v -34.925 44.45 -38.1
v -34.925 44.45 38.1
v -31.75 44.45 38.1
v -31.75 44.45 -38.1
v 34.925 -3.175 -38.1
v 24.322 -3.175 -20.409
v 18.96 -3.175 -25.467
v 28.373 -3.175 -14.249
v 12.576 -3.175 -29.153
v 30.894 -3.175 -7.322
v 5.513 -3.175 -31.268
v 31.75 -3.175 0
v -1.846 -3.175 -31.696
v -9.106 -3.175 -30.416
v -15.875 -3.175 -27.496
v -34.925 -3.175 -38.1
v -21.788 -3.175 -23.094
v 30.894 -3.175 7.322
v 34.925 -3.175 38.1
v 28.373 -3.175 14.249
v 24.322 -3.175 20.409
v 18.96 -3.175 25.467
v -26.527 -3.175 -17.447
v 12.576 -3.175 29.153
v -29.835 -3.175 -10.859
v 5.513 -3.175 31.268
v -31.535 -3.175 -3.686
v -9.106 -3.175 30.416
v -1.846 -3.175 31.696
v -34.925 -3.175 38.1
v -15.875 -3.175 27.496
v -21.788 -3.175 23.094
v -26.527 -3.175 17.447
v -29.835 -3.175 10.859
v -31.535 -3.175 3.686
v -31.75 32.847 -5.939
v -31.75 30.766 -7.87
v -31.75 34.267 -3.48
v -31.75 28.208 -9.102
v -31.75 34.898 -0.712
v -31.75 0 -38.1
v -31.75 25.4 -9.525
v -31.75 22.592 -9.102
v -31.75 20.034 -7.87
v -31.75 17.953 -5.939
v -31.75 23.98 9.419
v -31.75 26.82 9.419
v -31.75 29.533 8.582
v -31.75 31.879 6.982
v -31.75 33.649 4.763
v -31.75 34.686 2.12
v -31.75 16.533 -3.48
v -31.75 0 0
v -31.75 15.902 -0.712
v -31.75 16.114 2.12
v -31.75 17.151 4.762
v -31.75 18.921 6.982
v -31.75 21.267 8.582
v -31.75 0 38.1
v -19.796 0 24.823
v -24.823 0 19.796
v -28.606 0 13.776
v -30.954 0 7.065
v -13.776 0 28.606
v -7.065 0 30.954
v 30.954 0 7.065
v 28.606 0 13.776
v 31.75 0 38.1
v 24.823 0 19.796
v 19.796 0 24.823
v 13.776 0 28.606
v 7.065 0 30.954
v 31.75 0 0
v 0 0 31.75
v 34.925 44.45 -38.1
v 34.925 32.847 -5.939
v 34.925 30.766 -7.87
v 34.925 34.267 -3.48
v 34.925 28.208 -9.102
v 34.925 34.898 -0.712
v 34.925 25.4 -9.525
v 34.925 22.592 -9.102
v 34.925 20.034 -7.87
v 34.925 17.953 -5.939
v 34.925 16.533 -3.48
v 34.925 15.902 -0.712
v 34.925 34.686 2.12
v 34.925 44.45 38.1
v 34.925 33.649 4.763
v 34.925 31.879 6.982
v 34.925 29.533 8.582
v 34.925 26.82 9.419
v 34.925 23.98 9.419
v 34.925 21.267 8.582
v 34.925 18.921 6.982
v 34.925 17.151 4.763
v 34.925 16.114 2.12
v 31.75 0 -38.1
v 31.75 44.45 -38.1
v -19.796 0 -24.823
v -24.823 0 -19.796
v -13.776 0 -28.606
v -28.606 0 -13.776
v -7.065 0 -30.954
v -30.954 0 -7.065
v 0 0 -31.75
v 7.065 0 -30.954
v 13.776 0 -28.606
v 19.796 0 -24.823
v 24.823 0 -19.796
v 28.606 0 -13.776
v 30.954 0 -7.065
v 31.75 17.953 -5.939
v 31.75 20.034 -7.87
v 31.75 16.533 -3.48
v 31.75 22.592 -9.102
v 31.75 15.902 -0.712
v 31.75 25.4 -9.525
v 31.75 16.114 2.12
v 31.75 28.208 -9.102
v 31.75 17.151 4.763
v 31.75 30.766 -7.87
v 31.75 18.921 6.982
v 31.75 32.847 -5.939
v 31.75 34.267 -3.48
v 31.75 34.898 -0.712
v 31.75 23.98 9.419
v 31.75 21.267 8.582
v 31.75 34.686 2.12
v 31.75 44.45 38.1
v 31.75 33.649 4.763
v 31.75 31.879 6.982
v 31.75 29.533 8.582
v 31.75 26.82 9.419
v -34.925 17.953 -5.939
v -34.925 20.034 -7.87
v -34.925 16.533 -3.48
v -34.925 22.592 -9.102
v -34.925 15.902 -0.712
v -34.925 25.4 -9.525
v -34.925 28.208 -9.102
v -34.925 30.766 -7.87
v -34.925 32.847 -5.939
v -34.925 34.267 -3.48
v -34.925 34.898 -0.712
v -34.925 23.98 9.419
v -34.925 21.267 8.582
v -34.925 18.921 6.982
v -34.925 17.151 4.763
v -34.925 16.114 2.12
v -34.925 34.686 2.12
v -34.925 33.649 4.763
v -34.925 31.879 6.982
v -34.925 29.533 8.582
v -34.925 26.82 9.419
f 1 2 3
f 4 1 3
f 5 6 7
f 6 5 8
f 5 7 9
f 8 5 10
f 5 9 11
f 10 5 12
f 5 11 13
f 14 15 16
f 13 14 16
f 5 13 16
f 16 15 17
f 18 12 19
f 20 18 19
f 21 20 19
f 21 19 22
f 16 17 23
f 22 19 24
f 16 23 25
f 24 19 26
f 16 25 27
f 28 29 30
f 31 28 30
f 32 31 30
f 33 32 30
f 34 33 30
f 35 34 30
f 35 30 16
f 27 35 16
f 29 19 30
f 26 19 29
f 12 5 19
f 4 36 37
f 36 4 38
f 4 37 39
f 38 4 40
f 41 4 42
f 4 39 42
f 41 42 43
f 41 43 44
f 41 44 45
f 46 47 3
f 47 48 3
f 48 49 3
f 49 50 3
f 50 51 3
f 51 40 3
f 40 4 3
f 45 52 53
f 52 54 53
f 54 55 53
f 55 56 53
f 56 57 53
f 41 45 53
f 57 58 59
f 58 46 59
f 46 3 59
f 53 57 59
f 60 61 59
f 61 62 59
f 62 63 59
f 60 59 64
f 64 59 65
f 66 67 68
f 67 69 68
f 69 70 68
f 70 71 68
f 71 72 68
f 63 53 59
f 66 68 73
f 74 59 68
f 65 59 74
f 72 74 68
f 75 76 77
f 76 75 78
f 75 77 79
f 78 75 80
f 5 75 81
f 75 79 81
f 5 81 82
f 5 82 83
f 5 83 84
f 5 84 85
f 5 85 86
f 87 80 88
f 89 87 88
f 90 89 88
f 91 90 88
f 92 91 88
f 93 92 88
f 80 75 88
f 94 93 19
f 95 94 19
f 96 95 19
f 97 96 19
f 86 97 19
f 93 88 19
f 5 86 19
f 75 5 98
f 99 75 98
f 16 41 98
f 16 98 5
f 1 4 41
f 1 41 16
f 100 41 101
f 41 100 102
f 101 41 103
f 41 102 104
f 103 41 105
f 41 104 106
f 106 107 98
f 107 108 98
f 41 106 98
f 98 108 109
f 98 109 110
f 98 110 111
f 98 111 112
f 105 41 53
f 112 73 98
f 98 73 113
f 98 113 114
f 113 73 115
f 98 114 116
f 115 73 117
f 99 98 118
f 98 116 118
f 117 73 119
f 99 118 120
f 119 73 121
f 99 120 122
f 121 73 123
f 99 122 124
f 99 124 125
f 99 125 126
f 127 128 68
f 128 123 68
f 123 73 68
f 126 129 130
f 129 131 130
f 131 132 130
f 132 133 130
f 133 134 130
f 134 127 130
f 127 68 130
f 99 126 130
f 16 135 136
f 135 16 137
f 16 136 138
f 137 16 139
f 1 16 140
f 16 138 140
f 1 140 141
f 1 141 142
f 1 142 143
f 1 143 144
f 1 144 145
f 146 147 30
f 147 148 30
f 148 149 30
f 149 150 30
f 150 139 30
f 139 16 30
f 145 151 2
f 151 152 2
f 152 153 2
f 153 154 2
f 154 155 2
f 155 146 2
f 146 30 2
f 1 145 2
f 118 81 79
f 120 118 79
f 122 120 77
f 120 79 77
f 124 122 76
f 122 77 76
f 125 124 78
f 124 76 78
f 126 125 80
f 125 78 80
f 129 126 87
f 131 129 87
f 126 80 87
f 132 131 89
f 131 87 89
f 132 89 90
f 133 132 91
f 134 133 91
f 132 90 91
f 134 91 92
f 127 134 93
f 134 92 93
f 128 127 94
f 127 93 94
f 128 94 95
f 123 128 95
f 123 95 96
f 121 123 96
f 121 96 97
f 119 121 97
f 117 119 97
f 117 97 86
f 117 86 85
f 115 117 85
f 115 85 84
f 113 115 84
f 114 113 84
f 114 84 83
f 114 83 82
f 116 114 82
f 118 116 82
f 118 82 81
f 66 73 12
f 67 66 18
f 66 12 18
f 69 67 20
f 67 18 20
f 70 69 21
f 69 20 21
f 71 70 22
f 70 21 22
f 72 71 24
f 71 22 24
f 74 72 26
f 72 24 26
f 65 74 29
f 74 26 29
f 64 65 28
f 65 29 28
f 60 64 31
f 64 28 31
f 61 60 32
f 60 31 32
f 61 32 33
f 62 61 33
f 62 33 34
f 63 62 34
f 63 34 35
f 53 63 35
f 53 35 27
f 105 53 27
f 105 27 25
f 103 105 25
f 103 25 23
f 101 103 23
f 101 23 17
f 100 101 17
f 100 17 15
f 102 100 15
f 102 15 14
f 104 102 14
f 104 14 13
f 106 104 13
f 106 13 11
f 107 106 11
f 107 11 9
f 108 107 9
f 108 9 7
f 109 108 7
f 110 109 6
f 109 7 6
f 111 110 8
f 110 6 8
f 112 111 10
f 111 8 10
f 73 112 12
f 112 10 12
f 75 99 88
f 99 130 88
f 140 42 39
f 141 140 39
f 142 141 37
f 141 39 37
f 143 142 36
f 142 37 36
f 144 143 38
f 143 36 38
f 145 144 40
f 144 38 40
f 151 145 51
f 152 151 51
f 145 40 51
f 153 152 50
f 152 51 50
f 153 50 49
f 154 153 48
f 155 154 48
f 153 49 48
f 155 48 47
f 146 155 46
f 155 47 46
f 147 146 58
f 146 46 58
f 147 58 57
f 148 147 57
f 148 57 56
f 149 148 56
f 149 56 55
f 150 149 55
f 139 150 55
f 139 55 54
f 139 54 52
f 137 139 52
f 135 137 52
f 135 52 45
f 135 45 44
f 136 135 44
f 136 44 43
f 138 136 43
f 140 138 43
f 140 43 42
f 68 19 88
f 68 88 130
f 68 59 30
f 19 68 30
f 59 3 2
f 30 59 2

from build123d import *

# Parameters (mm, degrees)
BOSS_EXTRUDE1_DEPTH = 38.1
SKETCH2_R           = 9.525
CUT_EXTRUDE1_DEPTH  = 70.85
SKETCH3_R           = 31.75
CUT_EXTRUDE2_DEPTH  = 48.625


with BuildPart() as part:
    # Sketch1 → Boss-Extrude1 (new body, symmetric)
    with BuildSketch(Plane.XY):
        Polygon((-31.75, 0), (31.75, 0), (31.75, 44.45), (34.925, 44.45), (34.925, -3.175), (-34.925, -3.175), (-34.925, 44.45), (-31.75, 44.45), align=None)
    extrude(amount=BOSS_EXTRUDE1_DEPTH, both=True)

    # Sketch2 → Cut-Extrude1 (cut, through all)
    with BuildSketch(Plane(origin=(34.925, 0, 0), x_dir=(0, 0, -1), z_dir=(1, 0, 0))):
        with Locations((0, 25.4)):
            Circle(SKETCH2_R)
    extrude(amount=-CUT_EXTRUDE1_DEPTH, mode=Mode.SUBTRACT)

    # Sketch3 → Cut-Extrude2 (cut, through all)
    with BuildSketch(Plane.XZ.offset(3.175)):
        Circle(SKETCH3_R)
    extrude(amount=-CUT_EXTRUDE2_DEPTH, mode=Mode.SUBTRACT)


solid = part.part
